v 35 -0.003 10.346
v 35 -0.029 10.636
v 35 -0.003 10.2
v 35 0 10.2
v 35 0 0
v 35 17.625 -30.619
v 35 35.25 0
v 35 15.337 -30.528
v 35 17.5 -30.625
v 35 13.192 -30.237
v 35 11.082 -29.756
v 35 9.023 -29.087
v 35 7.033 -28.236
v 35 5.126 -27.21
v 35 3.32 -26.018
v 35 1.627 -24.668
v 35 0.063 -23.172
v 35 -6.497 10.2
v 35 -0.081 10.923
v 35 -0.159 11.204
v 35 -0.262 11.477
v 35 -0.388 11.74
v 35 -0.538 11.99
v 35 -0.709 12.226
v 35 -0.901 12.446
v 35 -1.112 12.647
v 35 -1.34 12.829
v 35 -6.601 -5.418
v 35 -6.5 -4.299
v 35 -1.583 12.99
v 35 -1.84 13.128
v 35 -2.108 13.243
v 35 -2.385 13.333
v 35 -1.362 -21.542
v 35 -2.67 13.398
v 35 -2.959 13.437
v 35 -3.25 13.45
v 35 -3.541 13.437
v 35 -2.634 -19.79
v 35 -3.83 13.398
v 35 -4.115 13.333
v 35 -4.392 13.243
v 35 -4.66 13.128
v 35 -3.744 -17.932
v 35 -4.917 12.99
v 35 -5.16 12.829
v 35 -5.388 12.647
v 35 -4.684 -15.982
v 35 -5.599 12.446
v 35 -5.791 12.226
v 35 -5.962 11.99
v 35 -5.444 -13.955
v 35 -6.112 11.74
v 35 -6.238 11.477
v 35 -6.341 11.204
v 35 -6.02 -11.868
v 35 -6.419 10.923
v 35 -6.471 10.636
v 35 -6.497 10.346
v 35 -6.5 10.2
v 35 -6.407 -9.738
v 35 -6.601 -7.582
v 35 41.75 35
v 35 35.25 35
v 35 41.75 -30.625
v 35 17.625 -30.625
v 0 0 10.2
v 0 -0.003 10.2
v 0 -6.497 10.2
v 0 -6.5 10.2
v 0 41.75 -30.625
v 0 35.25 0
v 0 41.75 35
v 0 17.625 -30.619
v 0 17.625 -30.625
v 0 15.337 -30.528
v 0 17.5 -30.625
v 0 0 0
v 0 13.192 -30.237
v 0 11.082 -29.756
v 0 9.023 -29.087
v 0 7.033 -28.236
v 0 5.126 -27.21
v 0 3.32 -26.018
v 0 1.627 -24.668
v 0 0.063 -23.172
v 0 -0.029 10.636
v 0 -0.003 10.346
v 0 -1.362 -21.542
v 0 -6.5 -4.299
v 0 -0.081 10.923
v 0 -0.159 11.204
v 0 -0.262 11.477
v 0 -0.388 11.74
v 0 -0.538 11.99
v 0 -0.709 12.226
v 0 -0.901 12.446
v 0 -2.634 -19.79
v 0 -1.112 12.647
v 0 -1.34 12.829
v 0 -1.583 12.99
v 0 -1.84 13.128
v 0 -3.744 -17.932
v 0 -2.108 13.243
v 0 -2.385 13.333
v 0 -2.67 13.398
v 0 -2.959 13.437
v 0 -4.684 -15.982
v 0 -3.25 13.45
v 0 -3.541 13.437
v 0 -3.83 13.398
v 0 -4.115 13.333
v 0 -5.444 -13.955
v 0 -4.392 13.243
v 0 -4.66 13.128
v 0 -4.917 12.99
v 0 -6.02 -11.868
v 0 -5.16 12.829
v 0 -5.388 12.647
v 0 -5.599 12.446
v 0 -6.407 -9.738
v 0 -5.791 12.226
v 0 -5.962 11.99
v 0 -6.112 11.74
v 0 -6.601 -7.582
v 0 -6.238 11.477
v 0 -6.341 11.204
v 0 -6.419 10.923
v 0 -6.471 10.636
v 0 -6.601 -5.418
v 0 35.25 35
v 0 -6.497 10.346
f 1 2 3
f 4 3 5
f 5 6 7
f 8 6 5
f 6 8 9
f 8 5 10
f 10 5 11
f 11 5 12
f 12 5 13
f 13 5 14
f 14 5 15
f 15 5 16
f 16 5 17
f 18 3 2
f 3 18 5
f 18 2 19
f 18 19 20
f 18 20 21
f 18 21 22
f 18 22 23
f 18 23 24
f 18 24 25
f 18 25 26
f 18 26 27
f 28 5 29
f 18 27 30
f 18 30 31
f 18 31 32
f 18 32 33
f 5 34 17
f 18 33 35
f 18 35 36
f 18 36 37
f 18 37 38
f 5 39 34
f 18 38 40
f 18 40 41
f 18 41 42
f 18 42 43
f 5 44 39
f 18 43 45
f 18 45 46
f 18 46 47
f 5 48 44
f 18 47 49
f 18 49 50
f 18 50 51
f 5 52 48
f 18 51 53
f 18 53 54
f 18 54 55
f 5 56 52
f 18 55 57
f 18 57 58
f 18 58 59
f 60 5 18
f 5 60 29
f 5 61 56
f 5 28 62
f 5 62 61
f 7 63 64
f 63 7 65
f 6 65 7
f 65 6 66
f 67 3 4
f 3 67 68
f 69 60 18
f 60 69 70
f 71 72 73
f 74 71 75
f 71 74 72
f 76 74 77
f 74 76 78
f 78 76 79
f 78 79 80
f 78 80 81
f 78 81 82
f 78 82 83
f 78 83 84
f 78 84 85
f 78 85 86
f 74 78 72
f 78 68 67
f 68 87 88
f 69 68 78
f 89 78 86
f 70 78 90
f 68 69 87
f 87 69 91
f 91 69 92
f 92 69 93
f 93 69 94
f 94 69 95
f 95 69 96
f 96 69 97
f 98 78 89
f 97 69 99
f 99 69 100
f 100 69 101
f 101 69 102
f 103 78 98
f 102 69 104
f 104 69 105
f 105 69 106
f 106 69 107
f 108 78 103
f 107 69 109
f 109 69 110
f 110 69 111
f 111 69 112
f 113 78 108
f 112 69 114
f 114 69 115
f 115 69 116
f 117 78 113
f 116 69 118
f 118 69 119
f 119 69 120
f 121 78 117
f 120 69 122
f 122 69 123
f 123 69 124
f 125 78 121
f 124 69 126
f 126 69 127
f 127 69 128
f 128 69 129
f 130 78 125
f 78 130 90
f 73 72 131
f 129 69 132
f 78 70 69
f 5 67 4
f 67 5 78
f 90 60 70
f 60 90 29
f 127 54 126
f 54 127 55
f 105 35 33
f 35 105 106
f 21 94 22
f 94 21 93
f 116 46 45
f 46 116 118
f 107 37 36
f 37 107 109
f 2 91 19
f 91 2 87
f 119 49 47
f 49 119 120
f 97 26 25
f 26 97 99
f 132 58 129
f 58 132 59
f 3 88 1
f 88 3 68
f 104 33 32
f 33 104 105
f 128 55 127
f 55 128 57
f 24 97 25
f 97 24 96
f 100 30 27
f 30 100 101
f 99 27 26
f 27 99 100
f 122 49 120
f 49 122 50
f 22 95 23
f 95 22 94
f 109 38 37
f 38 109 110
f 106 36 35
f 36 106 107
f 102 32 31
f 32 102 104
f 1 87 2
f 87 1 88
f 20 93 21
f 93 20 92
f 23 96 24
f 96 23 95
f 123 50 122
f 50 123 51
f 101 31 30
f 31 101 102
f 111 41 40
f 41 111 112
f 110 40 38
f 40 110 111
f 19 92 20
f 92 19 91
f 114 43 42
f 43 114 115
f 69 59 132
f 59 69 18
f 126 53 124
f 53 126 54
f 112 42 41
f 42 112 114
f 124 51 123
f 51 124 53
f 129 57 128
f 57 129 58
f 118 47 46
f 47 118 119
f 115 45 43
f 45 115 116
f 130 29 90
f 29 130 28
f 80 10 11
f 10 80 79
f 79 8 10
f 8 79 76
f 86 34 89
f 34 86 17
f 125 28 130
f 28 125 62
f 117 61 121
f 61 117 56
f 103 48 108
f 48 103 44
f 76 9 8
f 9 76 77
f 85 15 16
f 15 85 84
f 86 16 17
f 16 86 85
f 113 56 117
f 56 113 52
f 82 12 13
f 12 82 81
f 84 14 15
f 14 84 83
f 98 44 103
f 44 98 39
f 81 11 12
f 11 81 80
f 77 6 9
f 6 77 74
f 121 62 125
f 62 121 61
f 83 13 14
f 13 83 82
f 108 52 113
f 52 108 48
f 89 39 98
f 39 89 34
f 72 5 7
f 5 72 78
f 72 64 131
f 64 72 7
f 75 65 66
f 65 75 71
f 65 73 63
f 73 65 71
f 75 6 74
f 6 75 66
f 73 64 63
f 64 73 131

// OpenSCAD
//Solarpanel
$fn=70;
//Breite
b=1765;
//Höhe
h=1038;
//Tiefe
d=35.25;
//Breite Panelrand
br=11.5;
//Höhe Panelrand
hr=8.2;
//Tiefe Panelrand
tr=2.55;
//Breite Rand zu Solarzellen (max!)
bs=4.0;
//Kabel Durchmesser
kd=6.5;

//Tiefe Rand hinten
trh=35.0;
//Tiefe hinten
th=27.5;

//Breite Basishalter aus Kuben
brh=trh;

//Dicke Basishalter aus Kuben
dbh=kd;

bi=b-br*2; //Breite Innenbereich komplett
hi=h-hr*2; //Hoehe Innenbereich komplett

bz=bi-bs*2; //Breite nur Solarzellenbereich
hz=hi-bs*2; //Hoehe nur Solarzellenbereich

bb=b-trh*2; //Breite hinten innen
db=th; //Tiefe hinten innen
hb=h-trh*2; //Hoehe hinten innen

//Hinterer Kreis
hk=kd*10;

module panel_full() {
    color("#666666")
    cube([b,d,h]);
}

module panel_space_front() {
    color("#BBBBBB")
    translate([br,0,hr])
    cube([bi,tr,hi]);
}

module panel_space_solarcells() {
    translate([br+bs,0,hr+bs])
    cube([bz,tr,hz]);
}

module panel_back() {
    translate([trh,d-th,trh])
    cube([bb,db,hb]);
}

module solarpanel() {
    difference() {
        panel_full();
        panel_space_front();
        panel_space_solarcells();
        panel_back();
    }
}

module test_hinten() {
    rotate([0,270,0]) {
        
        //Kabel
        translate([0,0,-b])
        color("red")
        linear_extrude(b)
        translate([trh+kd/2,kd/2+d,0])        
        circle(d = kd);
        
//        difference() {
//            translate([hk/4,hk/2+d,0])
//            circle(d = hk);
//            
//            color("blue")
//            translate([hk/4,hk/2+d+hk/6,0])
//            square(hk, true);
//        }
        //circle(d = hk*2);
    }
}

module cube_hinten() {
    translate([0,d,0]) //Versetzt um Dicke des Panel nach hinten
    cube([brh,dbh,trh]); //BreiteHalter,DickeBasisHalter,TiefeRandHinten
}

module cube_unten() {
    translate([0,0,-dbh]) //Versetzt um Dicke Basishalter
    cube([brh,d+dbh,dbh]); //BreiteHalter,Dicke des Panel+DickeBasisHalter,DickeBasishalter
}

module cube_vorne() {
    translate([0,-dbh,-dbh])
    cube([brh,dbh,dbh+hr+bs/2]); //Höhe ist DickeBasishalter+Höhe des Panelrand(hr)+Breite Rand zu Solarzellen (max!)(bs)/2
    
    //=> Damit das gescheit auch hier reingeht, eine Halbe Kugel oben drauf mit bs/2 statt Kubus um bs/2 zu erhöhen. Kubus bleibt, aber weil mir sonst die Schneiderei mit dem quarter_cylinder zu komplex wird und wird kommen dann auf ein bisschen höher, aber die Sonne kommt ja von oben
    translate([brh,-dbh/2,hr+bs/2])
    rotate([0,270,0])    
    cylinder(h=brh, d=dbh);
}

//Viertel Zylinder unten als halter mit radius so groß wie die zusammengesetzten Kuben jetzt tief sind insgesamt: //Schraube(n) mit vertikaler Nut (mit Beilagscheibendurchmesser!) nur hier, damit wir das nachfixieren können, wenn wir die Höhe noch anpassen wollen, wenn das Panel dann drauf ist.
module quarter_cylinder() {
    bqc= dbh+d+dbh; //Breite Quarter Cylinder
    difference() {
        translate([brh,brh/2,-dbh])
        rotate([0,270,0])    
        cylinder(h=brh, d=bqc);
        
        panel_full();
    }
    translate([0,-dbh+bqc/2,-bqc/2-dbh])
    cube([brh,bqc/2,bqc/2]);
}

//Gleitabschnitt hinten oben noch

//Prototyp mit brh = 1 oder so drucken



//test_hinten();

//solarpanel();

cube_hinten();
cube_unten();
cube_vorne();
quarter_cylinder();
